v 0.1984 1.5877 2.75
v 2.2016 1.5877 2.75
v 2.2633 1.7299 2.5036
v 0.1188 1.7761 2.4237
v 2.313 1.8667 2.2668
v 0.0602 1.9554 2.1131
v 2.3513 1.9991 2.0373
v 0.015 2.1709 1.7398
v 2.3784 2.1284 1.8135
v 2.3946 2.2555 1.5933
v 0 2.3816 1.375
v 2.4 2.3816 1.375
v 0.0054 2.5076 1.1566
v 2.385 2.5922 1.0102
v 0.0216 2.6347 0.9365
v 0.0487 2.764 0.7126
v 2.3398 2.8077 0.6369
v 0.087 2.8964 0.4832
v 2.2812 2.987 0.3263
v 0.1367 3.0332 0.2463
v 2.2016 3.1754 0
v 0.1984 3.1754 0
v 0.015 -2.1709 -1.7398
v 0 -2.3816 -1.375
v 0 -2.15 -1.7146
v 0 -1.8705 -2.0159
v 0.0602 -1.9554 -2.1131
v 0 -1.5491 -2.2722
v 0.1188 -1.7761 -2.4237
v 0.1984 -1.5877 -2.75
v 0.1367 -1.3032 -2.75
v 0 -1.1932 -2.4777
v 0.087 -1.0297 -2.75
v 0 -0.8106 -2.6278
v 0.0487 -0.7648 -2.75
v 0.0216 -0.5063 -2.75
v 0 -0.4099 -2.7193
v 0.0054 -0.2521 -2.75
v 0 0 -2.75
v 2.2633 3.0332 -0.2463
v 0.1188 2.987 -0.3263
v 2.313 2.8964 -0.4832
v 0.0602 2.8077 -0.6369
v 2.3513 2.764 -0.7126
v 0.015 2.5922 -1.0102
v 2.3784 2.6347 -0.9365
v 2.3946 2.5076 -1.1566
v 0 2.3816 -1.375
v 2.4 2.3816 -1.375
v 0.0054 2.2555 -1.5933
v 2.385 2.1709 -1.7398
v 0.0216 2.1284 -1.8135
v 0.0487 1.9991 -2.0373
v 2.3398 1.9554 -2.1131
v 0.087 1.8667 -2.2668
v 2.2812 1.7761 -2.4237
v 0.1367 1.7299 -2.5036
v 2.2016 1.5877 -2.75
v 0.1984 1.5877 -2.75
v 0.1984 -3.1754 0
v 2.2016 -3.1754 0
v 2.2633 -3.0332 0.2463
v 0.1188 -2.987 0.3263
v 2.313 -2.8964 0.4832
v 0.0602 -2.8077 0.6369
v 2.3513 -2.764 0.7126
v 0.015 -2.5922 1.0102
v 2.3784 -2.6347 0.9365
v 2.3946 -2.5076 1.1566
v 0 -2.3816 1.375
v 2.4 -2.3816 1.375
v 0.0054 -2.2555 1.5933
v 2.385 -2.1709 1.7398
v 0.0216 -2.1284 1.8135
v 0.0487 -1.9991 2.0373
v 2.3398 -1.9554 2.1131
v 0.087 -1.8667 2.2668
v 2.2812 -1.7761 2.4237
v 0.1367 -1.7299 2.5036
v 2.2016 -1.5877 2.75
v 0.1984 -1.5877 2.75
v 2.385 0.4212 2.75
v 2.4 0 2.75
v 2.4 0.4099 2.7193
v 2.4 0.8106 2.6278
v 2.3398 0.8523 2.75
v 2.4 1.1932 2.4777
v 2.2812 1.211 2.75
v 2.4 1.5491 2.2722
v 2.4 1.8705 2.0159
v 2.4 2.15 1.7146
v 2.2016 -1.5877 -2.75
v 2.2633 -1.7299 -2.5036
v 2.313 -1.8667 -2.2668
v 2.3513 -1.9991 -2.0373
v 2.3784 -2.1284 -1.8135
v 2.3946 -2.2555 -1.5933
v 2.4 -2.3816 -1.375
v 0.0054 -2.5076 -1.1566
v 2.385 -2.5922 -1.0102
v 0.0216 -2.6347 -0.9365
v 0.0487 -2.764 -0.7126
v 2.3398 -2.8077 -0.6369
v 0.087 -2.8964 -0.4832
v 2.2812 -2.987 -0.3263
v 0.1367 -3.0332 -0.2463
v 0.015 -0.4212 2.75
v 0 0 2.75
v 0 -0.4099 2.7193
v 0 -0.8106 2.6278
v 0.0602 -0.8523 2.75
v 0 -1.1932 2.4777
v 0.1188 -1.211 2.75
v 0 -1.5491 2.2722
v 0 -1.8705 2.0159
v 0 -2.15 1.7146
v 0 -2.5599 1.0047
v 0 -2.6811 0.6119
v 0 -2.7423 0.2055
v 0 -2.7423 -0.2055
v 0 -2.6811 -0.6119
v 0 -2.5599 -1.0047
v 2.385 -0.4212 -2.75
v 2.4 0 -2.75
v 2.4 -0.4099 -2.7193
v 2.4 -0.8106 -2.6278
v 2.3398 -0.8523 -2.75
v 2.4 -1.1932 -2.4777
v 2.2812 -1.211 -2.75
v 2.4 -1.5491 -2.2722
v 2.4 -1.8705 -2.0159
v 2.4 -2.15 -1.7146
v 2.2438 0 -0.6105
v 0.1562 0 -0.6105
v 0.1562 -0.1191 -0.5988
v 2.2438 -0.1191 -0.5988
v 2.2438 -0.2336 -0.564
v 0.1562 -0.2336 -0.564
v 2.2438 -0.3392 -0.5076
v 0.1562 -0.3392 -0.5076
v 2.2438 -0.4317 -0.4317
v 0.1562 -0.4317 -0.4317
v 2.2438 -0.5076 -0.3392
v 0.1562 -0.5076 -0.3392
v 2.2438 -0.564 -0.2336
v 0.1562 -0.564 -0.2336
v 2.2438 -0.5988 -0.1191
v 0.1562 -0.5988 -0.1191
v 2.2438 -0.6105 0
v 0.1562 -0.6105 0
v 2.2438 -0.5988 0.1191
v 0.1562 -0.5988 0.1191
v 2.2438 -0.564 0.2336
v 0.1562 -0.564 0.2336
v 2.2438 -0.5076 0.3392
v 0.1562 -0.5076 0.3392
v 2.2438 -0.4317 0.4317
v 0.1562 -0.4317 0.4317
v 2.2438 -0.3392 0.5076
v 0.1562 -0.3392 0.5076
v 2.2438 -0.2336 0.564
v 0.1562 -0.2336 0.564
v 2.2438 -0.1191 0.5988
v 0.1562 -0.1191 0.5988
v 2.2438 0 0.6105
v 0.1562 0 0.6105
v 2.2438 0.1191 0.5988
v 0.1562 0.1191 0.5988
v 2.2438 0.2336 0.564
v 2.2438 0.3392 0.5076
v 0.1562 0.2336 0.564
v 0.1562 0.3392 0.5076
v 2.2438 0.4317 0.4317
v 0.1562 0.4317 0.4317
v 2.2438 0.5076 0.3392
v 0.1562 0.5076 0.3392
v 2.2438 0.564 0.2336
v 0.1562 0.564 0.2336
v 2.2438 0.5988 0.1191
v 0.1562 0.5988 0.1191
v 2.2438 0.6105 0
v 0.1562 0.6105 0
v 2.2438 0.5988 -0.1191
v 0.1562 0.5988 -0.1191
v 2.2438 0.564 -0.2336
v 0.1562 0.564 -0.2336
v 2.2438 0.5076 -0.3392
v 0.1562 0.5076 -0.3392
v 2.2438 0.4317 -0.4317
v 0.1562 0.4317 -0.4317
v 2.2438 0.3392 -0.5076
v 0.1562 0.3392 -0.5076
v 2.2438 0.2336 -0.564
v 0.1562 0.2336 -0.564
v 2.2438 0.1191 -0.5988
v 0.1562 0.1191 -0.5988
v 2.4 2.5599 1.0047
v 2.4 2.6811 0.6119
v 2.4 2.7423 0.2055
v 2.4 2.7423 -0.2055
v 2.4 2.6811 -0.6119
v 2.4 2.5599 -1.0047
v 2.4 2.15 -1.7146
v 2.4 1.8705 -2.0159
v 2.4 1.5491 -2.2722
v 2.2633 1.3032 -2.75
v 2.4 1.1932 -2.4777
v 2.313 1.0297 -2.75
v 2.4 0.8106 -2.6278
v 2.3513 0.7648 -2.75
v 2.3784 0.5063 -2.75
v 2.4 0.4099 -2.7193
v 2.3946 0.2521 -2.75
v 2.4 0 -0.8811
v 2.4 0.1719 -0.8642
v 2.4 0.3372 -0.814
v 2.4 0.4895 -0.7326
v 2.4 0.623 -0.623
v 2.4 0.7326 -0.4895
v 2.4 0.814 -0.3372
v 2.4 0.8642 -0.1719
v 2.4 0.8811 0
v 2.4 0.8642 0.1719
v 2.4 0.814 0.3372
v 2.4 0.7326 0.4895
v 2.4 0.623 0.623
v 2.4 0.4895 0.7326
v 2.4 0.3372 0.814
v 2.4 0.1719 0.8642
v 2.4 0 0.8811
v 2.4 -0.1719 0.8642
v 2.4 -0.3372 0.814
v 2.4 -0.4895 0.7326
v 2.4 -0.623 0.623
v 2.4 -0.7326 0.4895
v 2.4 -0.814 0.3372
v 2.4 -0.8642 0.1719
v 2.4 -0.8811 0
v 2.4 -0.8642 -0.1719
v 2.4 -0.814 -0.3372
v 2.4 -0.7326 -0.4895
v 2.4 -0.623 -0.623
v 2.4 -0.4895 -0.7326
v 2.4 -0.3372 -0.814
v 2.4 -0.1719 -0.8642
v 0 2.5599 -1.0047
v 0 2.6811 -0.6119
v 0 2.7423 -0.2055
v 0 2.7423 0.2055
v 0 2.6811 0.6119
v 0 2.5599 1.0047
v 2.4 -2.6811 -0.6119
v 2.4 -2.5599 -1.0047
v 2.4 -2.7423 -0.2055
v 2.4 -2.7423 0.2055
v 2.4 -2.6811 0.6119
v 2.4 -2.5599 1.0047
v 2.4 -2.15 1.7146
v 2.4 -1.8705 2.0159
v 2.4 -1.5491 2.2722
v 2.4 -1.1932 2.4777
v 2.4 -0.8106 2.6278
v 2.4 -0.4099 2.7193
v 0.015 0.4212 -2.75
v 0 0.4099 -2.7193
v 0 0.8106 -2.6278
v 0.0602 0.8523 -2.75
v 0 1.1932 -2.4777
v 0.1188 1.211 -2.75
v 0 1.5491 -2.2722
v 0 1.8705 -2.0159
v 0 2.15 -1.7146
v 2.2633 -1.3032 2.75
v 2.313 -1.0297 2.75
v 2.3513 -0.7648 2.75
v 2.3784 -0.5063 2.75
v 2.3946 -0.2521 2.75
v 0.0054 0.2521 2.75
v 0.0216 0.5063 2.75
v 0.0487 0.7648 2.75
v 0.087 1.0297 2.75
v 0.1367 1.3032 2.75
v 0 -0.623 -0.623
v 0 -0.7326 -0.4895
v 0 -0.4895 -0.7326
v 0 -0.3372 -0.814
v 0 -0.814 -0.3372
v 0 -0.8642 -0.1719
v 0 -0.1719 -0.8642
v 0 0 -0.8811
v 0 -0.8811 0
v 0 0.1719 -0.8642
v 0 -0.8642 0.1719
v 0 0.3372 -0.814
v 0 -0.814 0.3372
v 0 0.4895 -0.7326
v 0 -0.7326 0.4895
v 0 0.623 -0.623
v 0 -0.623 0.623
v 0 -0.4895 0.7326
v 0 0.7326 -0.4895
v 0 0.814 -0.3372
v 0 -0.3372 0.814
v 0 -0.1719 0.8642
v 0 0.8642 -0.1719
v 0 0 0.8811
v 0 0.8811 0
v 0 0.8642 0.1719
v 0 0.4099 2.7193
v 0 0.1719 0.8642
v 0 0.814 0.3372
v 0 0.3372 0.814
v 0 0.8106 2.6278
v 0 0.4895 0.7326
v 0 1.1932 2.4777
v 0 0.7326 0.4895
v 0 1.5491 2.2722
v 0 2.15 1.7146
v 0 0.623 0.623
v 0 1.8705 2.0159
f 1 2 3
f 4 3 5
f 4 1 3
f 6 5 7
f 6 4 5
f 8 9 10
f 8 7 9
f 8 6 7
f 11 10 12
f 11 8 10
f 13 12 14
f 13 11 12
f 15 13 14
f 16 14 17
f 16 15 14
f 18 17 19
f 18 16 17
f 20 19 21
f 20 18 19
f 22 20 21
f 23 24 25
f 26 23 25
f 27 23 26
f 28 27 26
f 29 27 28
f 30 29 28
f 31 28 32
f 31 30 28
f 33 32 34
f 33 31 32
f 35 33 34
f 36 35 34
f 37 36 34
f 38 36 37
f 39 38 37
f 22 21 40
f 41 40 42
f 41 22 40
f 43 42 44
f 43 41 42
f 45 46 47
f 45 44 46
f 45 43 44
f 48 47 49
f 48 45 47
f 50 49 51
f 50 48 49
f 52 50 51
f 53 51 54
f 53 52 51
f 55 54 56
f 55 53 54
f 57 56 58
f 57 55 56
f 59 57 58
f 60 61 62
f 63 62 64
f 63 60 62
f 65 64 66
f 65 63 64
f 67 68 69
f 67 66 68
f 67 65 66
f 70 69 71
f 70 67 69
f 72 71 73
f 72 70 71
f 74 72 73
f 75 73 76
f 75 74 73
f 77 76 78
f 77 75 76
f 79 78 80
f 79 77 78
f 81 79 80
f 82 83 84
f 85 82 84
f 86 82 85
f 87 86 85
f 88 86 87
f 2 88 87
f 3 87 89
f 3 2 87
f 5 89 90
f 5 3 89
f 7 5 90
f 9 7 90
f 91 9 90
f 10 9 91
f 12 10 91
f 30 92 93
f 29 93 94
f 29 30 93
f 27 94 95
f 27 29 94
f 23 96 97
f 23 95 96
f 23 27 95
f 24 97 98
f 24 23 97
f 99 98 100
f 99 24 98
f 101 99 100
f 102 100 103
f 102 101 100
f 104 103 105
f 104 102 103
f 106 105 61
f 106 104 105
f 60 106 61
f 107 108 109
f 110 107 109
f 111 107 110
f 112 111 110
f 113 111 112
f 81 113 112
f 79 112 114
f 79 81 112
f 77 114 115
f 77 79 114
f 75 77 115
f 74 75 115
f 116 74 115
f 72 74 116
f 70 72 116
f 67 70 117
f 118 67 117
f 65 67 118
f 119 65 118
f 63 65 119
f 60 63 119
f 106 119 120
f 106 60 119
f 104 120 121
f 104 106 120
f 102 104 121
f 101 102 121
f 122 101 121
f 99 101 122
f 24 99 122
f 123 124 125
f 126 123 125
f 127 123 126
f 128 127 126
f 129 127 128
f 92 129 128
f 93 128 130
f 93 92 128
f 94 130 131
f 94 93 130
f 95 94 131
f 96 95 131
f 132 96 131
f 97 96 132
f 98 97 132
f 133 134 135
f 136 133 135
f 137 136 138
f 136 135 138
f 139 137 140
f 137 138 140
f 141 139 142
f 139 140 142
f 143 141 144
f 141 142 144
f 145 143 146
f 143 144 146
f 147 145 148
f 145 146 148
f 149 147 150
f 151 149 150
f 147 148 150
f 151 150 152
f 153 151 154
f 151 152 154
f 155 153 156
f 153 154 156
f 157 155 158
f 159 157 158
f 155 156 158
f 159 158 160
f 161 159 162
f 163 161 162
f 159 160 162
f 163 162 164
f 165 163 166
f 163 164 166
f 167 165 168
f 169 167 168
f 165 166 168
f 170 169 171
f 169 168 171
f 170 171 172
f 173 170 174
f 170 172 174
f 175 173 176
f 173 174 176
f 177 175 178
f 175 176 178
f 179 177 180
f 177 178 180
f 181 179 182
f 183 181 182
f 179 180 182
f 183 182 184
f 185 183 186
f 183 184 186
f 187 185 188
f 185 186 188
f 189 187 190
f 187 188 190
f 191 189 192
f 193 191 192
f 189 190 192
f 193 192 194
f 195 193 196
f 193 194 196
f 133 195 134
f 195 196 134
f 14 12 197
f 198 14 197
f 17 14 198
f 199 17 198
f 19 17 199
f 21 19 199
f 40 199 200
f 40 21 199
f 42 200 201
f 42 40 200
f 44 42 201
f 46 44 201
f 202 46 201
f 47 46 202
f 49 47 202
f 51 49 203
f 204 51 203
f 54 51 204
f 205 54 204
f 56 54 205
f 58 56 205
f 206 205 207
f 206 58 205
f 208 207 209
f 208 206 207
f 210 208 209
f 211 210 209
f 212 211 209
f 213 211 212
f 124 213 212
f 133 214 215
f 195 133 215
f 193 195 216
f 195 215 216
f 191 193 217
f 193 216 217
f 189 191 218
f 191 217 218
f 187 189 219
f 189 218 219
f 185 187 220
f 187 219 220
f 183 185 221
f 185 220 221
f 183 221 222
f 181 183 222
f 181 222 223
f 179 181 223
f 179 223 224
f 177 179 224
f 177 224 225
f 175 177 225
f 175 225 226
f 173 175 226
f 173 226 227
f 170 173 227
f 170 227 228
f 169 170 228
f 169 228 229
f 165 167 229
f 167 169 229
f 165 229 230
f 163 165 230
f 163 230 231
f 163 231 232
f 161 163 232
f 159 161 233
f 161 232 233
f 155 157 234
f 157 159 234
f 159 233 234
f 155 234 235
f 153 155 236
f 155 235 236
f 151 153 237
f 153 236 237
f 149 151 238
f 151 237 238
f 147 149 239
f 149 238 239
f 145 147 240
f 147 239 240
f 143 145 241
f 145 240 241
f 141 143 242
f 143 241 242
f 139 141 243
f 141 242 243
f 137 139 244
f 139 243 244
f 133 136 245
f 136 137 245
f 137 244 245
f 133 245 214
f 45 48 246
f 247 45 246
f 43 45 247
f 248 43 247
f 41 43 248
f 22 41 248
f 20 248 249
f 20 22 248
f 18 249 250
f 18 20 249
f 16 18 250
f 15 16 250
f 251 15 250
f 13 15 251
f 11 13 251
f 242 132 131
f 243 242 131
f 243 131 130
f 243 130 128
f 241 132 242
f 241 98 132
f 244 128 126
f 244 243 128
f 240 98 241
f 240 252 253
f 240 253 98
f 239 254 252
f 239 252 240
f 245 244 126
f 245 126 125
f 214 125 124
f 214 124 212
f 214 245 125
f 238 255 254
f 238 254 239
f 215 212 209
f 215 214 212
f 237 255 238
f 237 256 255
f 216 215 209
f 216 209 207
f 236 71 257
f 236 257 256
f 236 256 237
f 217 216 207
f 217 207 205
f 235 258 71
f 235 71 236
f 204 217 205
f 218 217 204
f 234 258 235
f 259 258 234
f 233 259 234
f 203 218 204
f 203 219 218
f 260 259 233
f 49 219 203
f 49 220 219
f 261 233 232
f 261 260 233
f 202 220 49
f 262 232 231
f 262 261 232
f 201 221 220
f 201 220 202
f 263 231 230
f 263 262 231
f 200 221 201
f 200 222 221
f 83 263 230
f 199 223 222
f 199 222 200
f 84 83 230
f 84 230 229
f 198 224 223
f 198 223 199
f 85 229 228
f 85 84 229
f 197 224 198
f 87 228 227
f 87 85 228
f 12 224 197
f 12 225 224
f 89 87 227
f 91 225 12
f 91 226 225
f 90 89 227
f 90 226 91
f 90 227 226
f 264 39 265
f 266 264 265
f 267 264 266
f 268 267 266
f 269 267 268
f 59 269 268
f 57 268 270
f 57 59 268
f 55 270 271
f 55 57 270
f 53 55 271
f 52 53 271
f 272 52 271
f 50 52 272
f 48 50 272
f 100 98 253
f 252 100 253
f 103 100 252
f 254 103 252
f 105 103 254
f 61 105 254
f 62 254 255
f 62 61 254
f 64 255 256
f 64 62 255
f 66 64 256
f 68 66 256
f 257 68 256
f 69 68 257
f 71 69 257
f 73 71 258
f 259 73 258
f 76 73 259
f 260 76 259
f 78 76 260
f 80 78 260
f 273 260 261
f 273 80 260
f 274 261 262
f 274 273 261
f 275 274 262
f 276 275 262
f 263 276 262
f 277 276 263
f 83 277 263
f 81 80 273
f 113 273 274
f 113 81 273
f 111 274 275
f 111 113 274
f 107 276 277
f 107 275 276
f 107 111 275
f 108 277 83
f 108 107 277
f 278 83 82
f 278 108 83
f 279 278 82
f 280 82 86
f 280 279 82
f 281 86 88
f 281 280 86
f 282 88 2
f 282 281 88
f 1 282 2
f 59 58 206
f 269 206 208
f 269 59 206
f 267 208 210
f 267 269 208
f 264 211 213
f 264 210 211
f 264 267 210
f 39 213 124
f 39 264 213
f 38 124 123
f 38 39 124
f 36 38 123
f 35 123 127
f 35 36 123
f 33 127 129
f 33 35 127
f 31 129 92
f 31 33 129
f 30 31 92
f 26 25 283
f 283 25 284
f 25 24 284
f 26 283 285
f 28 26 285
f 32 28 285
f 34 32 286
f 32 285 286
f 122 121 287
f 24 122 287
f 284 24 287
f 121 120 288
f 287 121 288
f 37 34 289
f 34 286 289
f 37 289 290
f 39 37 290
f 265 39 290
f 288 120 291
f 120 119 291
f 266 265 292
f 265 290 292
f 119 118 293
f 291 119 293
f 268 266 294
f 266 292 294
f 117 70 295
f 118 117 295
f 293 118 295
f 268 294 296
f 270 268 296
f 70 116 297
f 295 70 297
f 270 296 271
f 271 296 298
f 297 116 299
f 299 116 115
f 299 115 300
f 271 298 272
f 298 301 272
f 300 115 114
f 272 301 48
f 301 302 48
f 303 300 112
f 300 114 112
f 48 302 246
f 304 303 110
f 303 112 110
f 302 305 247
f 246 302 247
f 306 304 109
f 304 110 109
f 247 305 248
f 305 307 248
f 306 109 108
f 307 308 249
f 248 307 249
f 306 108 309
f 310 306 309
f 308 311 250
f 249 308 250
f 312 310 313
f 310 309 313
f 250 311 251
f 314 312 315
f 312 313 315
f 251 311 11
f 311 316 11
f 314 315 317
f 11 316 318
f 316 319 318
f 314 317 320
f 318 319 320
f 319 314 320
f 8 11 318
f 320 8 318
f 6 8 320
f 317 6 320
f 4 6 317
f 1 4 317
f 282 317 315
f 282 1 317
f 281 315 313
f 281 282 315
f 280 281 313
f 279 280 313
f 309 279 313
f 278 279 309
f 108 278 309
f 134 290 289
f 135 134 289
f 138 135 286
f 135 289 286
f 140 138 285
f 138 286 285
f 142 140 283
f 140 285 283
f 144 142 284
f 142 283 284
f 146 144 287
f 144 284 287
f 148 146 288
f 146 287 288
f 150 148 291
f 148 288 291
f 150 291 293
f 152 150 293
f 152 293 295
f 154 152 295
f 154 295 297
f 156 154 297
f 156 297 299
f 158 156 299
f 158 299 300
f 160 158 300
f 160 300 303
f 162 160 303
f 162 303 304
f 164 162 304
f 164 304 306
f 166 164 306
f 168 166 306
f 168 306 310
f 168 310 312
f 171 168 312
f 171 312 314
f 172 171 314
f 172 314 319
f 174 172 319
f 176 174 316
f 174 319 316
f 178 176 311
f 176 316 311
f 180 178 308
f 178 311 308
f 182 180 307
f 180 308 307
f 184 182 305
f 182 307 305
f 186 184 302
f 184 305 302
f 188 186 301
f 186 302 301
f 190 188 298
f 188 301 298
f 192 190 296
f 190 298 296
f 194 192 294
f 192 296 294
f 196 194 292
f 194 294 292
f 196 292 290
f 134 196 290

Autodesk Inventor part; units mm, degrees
ref_plane "YZ Plane" through (0, 0, 0) normal (1, 0, 0) x (0, 1, 0)
ref_plane "XZ Plane" through (0, 0, 0) normal (0, 1, 0) x (-1, 0, 0)
sketch "Sketch1" plane through (0, 0, 0) normal (1, 0, 0) x (0, 1, 0)
  line L0 (-3.1754, 0) -> (-1.5877, 2.75)
  line L1 (-1.5877, 2.75) -> (1.5877, 2.75)
  line L2 (1.5877, 2.75) -> (3.1754, 0)
  line L3 (3.1754, 0) -> (1.5877, -2.75)
  line L4 (1.5877, -2.75) -> (-1.5877, -2.75)
  line L5 (-1.5877, -2.75) -> (-3.1754, 0)
  point P0 (0, 0)
  point P1 (0, 0)
  dimension "d0" = 6.3509
extrude "Body" add sketch "Sketch1" along normal blind 2.4
sketch "Sketch2" plane through (0, 0, 0) normal (0, 0, 1) x (1, 0, 0)
  line L0 (0, 1.5877) -> (0, 3.1754) projected
  line L1 (0, 3.1754) -> (2.4, 3.1754) projected
  line L2 (2.4, 1.5877) -> (2.4, 3.1754) projected
  line L3 (-0.16, 0) -> (0.96, 0) projected
  line L4 (0.1984, 3.1754) -> (0, 2.75)
  line L5 (2.2016, 3.1754) -> (2.4, 2.75)
  dimension "d3" = 25
  dimension "d4" = 25
  dimension "d5" = 5.5
  dimension "d6" = 5.5
revolve "Chamfer1" cut sketch "Sketch2" angle 360 about axis through (-10, 0, 0) along (1, 0, 0)
sketch "Sketch3" plane through (2.4, 0, 0) normal (1, 0, 0) x (0, 0, -1)
  arc A0 (-1.375, -2.3816) -> (1.375, -2.3816) centre (0, 0) ccw projected
hole "Thread" at (2.4, 0, 0) direction (-1, 0, 0) diameter 1.221 end through all thread size "M1.6x0.35" class "6H" standard "ANSI Metric M Profile"
chamfer "Chamfer2" distance 0.2706 angle 30 1 edges at (2.4, 0, 0.6105) measured on face at (2.4, -2.0253, -0.0245)
chamfer "Chamfer3" distance 0.2706 angle 30 1 edges at (0, 0, 0.6105) measured on face at (0, -2.0253, -0.0245)
ref_plane "Work Plane1" through (-6.3375, 0, 0) normal (0, -0.8660254, -0.5) x (1, 0, 0)
equation "\"d0\" = 1.1547 * SW"
equation "\"d1\" = KOH"
equation "\"d3\" = ANG1"
equation "\"d4\" = ANG2"
equation "\"d5\" = SW0"
equation "\"d6\" = SW01"
equation "\"d8\" = -0.5 * GD1 + 0.5 * NND"
equation "\"d40\" = -0.5 * GD1 + 0.5 * NND"
equation "\"d10\" = -0.5 * GD1 + 0.5 * NND"
equation "\"d41\" = -0.5 * GD1 + 0.5 * NND"
equation "\"ANG1\" = 25deg"
equation "\"ANG2\" = 25deg"
equation "\"NND\" = 3"
equation "\"KOH\" = 2.4"
equation "\"SW\" = 5.5"
equation "\"SW0\" = SW"
equation "\"SW01\" = SW"
equation "\"GUL\" = 0.541266 * PTC"
equation "\"THREADDIA\" = 3"
equation "\"TOA\" = 30deg"
equation "\"PTC\" = 0.5"
equation "\"E0\" = 1.155 * SW"
equation "\"GAL\" = 0.541266 * PTC"
equation "\"SD2\" = 0"
equation "\"WFT\" = 0"
equation "\"GD1\" = 2.458734"
properties part number "ANSI B 18.2.4.1 M - M3 x 0.5" material "Steel, Mild"
